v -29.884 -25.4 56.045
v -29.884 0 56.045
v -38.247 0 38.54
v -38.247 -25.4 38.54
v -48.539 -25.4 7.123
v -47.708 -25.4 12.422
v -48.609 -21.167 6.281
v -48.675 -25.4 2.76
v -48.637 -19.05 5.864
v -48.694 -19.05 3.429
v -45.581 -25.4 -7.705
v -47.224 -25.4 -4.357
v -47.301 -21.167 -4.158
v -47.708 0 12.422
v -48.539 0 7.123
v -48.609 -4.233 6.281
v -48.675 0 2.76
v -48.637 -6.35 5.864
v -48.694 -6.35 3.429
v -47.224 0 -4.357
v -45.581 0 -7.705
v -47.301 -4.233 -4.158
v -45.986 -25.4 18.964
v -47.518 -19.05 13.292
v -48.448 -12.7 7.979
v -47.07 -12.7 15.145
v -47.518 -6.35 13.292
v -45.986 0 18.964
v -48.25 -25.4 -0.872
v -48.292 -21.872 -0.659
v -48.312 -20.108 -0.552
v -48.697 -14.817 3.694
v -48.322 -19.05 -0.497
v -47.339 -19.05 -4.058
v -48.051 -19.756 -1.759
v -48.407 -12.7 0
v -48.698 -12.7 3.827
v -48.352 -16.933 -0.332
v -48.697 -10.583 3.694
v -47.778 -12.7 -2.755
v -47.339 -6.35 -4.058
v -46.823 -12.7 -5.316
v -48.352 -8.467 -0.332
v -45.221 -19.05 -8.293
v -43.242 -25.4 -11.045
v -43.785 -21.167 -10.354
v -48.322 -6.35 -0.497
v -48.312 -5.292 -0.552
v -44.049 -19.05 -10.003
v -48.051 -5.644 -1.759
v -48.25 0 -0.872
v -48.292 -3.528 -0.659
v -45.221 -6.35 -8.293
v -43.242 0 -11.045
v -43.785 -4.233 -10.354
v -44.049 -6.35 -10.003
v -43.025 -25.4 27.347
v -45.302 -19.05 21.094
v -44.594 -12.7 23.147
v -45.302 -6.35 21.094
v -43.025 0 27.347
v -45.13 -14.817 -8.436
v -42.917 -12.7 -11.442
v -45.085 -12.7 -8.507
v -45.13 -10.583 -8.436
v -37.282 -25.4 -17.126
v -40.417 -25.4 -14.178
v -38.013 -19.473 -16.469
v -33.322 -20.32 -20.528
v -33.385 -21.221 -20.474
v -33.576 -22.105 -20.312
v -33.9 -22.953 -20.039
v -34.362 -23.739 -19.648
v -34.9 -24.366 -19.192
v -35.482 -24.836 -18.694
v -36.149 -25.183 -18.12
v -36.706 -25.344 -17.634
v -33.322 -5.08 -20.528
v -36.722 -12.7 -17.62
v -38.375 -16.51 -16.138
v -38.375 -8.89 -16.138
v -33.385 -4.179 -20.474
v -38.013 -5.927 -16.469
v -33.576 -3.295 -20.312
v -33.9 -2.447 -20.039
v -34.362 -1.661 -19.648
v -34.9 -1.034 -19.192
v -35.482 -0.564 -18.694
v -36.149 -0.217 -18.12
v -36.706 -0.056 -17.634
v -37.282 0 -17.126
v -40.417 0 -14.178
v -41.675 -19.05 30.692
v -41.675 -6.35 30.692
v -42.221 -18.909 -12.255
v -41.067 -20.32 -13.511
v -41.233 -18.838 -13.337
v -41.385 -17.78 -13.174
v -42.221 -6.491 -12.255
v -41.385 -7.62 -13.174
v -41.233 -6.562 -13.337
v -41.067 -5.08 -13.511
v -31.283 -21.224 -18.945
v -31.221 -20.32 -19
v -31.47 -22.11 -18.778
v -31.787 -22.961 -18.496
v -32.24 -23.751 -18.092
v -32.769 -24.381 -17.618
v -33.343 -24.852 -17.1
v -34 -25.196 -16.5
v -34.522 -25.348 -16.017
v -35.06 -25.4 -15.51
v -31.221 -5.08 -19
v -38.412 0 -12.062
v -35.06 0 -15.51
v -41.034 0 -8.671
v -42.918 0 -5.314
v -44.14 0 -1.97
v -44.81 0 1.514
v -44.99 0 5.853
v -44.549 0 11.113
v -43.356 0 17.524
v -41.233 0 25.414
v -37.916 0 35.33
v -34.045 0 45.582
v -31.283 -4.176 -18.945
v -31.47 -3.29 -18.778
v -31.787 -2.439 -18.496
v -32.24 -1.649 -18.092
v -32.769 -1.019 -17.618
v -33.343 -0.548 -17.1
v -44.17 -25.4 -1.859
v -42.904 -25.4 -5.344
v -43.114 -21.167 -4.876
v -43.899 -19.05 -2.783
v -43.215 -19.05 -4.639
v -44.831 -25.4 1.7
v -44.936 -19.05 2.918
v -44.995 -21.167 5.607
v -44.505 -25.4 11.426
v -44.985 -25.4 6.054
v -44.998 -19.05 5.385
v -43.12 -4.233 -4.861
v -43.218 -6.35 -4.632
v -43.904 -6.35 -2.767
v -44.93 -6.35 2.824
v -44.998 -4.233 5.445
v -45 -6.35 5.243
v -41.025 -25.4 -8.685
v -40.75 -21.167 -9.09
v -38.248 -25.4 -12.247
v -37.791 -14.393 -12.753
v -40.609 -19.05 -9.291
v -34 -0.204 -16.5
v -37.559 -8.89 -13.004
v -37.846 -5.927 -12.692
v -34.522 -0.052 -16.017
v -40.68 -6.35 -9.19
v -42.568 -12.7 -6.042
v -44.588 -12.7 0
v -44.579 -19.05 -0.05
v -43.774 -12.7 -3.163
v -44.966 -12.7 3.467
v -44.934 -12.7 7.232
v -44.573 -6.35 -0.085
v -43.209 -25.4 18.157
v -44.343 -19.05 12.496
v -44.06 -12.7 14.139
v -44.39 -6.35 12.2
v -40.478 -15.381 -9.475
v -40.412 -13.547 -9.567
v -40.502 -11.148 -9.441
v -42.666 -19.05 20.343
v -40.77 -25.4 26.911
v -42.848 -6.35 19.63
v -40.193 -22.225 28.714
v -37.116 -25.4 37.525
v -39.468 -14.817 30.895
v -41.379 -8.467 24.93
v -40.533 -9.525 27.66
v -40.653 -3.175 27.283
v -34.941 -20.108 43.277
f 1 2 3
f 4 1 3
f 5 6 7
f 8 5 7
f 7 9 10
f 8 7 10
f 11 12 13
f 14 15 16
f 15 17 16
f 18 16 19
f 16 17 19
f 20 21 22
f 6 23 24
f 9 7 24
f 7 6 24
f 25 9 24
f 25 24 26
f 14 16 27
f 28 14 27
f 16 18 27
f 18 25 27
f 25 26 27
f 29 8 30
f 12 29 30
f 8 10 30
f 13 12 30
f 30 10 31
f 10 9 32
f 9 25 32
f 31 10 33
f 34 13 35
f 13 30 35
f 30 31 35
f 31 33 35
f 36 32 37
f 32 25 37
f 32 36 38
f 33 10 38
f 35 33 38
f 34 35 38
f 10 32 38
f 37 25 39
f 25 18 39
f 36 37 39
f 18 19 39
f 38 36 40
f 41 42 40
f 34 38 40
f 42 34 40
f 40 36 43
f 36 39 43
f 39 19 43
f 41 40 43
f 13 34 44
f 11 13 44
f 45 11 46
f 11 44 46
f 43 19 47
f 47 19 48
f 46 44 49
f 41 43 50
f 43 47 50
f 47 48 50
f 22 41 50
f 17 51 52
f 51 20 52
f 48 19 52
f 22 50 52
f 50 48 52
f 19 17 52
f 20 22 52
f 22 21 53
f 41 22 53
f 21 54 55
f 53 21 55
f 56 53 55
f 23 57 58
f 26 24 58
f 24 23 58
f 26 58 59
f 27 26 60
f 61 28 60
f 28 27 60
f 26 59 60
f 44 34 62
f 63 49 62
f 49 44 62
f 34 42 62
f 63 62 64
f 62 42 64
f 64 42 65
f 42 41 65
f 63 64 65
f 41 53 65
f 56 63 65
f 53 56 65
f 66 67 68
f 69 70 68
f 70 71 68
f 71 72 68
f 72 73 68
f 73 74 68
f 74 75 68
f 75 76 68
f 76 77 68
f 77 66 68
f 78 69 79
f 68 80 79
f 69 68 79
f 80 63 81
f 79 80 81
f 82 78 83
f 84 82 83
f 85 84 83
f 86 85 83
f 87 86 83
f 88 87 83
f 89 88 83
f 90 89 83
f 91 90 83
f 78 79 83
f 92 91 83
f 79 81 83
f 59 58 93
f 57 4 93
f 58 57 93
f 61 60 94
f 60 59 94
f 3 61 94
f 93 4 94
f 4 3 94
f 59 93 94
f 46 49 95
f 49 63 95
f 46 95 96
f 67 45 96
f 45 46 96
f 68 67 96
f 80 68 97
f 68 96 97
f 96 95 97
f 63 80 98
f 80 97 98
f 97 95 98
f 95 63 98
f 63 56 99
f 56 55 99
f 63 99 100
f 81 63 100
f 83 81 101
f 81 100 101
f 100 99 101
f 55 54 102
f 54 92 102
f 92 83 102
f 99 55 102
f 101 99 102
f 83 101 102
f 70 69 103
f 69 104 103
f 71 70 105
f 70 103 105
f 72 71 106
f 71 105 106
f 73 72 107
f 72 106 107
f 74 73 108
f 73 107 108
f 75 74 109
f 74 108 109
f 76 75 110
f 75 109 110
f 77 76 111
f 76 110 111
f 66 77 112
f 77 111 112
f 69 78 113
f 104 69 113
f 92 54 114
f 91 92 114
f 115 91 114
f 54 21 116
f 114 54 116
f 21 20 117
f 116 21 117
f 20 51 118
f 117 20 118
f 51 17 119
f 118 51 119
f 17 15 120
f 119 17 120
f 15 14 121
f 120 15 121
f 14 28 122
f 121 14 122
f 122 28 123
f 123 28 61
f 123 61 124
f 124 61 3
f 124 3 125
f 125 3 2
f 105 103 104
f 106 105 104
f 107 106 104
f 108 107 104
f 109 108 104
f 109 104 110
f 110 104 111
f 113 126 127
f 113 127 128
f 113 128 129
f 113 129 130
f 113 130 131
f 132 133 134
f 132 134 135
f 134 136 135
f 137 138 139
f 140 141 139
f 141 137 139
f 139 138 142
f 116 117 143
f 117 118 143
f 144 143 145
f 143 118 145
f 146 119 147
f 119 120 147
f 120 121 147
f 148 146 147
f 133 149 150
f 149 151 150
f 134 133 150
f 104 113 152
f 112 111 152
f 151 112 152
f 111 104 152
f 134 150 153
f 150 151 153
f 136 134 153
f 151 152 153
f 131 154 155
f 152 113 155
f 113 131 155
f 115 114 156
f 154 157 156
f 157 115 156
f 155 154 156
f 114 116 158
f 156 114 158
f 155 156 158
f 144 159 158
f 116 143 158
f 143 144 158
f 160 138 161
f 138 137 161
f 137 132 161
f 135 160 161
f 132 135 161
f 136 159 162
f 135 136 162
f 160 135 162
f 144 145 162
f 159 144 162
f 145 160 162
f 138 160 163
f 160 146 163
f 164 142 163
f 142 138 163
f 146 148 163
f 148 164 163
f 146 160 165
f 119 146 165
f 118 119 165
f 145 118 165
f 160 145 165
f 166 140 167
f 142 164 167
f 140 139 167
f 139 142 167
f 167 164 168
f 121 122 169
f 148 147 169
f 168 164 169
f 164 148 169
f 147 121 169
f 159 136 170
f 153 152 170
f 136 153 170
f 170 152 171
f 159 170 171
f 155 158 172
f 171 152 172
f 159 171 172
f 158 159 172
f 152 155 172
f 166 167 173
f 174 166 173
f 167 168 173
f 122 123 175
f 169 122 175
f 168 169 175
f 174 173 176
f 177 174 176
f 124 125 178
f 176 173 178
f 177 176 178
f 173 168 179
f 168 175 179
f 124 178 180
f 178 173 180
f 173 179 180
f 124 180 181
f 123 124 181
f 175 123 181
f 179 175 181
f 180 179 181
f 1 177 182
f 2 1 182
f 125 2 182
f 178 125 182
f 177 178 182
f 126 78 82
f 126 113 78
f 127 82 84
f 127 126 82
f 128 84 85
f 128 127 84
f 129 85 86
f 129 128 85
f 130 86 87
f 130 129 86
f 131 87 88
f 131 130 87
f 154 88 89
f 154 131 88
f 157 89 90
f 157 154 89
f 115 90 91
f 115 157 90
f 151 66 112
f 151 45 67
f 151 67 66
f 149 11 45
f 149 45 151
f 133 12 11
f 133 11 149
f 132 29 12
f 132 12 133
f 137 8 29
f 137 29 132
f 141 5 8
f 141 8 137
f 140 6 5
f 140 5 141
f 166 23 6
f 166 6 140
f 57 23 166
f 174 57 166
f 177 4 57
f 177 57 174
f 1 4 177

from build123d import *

# Parameters (mm, degrees)
F1_DEPTH = 25.4
F2_R     = 5.08
F4_DEPTH = 19.05


with BuildPart() as f1:
    # F0 (on Front) → F1 (new body)
    with BuildSketch(Plane.XZ):
        with BuildLine():
            add(Edge.make_bspline(
                [(-31.2210861593, -18.9999882132), (-37.1420167425, -13.7320297606), (-52.4138535448, -0.1444018296), (-38.4403460871, 34.7062347556), (-29.8844035715, 56.0451894999)],
                knots=[0, 0, 0, 0, 0.3877025835, 1, 1, 1, 1], degree=3))
            add(Edge.make_bspline(
                [(-29.8844035715, 56.0451894999), (-40.2315032805, 34.8691003108), (-57.3760806559, -0.2185193917), (-40.1509864608, -14.7615918115), (-33.3215855062, -20.5276254565)],
                knots=[0, 0, 0, 0, 0.603520255, 1, 1, 1, 1], degree=3))
            Line((-33.3215855062, -20.5276254565), (-31.2210861593, -18.9999882132))
        make_face()
    extrude(amount=F1_DEPTH)

    # F2
    f2_edges = [f1.edges().sort_by_distance(p)[0] for p in [
        (-32.271336, 0, -19.763807),
        (-32.271336, -25.4, -19.763807),
    ]]
    fillet(f2_edges, radius=F2_R)

    # F3 (on face) → F4 (join)
    with BuildSketch(Plane.XZ.offset(25.4)):
        with BuildLine():
            Line((-37.2815900806, -17.1262230295), (-35.0597391764, -15.5103300302))
            add(Edge.make_bspline(
                [(-35.0597391764, -15.5103300302), (-35.820905502, -14.787798895), (-36.5649922945, -14.0528499794), (-37.2815900806, -13.2979150116)],
                knots=[0.0847886042, 0.0847886042, 0.0847886042, 0.0847886042, 0.1364647642, 0.1364647642, 0.1364647642, 0.1364647642], degree=3))
            Line((-37.2815900806, -13.2979150116), (-39.0489816205, -15.5103300302))
            add(Edge.make_bspline(
                [(-39.0489816205, -15.5103300302), (-38.4711466299, -16.0557129537), (-37.8806834298, -16.5935473371), (-37.2815900805, -17.1262230297)],
                knots=[0.8867275977, 0.8867275977, 0.8867275977, 0.8867275977, 0.9225893612, 0.9225893612, 0.9225893612, 0.9225893612], degree=3))
        make_face()
    extrude(amount=-F4_DEPTH)


solid = f1.part
